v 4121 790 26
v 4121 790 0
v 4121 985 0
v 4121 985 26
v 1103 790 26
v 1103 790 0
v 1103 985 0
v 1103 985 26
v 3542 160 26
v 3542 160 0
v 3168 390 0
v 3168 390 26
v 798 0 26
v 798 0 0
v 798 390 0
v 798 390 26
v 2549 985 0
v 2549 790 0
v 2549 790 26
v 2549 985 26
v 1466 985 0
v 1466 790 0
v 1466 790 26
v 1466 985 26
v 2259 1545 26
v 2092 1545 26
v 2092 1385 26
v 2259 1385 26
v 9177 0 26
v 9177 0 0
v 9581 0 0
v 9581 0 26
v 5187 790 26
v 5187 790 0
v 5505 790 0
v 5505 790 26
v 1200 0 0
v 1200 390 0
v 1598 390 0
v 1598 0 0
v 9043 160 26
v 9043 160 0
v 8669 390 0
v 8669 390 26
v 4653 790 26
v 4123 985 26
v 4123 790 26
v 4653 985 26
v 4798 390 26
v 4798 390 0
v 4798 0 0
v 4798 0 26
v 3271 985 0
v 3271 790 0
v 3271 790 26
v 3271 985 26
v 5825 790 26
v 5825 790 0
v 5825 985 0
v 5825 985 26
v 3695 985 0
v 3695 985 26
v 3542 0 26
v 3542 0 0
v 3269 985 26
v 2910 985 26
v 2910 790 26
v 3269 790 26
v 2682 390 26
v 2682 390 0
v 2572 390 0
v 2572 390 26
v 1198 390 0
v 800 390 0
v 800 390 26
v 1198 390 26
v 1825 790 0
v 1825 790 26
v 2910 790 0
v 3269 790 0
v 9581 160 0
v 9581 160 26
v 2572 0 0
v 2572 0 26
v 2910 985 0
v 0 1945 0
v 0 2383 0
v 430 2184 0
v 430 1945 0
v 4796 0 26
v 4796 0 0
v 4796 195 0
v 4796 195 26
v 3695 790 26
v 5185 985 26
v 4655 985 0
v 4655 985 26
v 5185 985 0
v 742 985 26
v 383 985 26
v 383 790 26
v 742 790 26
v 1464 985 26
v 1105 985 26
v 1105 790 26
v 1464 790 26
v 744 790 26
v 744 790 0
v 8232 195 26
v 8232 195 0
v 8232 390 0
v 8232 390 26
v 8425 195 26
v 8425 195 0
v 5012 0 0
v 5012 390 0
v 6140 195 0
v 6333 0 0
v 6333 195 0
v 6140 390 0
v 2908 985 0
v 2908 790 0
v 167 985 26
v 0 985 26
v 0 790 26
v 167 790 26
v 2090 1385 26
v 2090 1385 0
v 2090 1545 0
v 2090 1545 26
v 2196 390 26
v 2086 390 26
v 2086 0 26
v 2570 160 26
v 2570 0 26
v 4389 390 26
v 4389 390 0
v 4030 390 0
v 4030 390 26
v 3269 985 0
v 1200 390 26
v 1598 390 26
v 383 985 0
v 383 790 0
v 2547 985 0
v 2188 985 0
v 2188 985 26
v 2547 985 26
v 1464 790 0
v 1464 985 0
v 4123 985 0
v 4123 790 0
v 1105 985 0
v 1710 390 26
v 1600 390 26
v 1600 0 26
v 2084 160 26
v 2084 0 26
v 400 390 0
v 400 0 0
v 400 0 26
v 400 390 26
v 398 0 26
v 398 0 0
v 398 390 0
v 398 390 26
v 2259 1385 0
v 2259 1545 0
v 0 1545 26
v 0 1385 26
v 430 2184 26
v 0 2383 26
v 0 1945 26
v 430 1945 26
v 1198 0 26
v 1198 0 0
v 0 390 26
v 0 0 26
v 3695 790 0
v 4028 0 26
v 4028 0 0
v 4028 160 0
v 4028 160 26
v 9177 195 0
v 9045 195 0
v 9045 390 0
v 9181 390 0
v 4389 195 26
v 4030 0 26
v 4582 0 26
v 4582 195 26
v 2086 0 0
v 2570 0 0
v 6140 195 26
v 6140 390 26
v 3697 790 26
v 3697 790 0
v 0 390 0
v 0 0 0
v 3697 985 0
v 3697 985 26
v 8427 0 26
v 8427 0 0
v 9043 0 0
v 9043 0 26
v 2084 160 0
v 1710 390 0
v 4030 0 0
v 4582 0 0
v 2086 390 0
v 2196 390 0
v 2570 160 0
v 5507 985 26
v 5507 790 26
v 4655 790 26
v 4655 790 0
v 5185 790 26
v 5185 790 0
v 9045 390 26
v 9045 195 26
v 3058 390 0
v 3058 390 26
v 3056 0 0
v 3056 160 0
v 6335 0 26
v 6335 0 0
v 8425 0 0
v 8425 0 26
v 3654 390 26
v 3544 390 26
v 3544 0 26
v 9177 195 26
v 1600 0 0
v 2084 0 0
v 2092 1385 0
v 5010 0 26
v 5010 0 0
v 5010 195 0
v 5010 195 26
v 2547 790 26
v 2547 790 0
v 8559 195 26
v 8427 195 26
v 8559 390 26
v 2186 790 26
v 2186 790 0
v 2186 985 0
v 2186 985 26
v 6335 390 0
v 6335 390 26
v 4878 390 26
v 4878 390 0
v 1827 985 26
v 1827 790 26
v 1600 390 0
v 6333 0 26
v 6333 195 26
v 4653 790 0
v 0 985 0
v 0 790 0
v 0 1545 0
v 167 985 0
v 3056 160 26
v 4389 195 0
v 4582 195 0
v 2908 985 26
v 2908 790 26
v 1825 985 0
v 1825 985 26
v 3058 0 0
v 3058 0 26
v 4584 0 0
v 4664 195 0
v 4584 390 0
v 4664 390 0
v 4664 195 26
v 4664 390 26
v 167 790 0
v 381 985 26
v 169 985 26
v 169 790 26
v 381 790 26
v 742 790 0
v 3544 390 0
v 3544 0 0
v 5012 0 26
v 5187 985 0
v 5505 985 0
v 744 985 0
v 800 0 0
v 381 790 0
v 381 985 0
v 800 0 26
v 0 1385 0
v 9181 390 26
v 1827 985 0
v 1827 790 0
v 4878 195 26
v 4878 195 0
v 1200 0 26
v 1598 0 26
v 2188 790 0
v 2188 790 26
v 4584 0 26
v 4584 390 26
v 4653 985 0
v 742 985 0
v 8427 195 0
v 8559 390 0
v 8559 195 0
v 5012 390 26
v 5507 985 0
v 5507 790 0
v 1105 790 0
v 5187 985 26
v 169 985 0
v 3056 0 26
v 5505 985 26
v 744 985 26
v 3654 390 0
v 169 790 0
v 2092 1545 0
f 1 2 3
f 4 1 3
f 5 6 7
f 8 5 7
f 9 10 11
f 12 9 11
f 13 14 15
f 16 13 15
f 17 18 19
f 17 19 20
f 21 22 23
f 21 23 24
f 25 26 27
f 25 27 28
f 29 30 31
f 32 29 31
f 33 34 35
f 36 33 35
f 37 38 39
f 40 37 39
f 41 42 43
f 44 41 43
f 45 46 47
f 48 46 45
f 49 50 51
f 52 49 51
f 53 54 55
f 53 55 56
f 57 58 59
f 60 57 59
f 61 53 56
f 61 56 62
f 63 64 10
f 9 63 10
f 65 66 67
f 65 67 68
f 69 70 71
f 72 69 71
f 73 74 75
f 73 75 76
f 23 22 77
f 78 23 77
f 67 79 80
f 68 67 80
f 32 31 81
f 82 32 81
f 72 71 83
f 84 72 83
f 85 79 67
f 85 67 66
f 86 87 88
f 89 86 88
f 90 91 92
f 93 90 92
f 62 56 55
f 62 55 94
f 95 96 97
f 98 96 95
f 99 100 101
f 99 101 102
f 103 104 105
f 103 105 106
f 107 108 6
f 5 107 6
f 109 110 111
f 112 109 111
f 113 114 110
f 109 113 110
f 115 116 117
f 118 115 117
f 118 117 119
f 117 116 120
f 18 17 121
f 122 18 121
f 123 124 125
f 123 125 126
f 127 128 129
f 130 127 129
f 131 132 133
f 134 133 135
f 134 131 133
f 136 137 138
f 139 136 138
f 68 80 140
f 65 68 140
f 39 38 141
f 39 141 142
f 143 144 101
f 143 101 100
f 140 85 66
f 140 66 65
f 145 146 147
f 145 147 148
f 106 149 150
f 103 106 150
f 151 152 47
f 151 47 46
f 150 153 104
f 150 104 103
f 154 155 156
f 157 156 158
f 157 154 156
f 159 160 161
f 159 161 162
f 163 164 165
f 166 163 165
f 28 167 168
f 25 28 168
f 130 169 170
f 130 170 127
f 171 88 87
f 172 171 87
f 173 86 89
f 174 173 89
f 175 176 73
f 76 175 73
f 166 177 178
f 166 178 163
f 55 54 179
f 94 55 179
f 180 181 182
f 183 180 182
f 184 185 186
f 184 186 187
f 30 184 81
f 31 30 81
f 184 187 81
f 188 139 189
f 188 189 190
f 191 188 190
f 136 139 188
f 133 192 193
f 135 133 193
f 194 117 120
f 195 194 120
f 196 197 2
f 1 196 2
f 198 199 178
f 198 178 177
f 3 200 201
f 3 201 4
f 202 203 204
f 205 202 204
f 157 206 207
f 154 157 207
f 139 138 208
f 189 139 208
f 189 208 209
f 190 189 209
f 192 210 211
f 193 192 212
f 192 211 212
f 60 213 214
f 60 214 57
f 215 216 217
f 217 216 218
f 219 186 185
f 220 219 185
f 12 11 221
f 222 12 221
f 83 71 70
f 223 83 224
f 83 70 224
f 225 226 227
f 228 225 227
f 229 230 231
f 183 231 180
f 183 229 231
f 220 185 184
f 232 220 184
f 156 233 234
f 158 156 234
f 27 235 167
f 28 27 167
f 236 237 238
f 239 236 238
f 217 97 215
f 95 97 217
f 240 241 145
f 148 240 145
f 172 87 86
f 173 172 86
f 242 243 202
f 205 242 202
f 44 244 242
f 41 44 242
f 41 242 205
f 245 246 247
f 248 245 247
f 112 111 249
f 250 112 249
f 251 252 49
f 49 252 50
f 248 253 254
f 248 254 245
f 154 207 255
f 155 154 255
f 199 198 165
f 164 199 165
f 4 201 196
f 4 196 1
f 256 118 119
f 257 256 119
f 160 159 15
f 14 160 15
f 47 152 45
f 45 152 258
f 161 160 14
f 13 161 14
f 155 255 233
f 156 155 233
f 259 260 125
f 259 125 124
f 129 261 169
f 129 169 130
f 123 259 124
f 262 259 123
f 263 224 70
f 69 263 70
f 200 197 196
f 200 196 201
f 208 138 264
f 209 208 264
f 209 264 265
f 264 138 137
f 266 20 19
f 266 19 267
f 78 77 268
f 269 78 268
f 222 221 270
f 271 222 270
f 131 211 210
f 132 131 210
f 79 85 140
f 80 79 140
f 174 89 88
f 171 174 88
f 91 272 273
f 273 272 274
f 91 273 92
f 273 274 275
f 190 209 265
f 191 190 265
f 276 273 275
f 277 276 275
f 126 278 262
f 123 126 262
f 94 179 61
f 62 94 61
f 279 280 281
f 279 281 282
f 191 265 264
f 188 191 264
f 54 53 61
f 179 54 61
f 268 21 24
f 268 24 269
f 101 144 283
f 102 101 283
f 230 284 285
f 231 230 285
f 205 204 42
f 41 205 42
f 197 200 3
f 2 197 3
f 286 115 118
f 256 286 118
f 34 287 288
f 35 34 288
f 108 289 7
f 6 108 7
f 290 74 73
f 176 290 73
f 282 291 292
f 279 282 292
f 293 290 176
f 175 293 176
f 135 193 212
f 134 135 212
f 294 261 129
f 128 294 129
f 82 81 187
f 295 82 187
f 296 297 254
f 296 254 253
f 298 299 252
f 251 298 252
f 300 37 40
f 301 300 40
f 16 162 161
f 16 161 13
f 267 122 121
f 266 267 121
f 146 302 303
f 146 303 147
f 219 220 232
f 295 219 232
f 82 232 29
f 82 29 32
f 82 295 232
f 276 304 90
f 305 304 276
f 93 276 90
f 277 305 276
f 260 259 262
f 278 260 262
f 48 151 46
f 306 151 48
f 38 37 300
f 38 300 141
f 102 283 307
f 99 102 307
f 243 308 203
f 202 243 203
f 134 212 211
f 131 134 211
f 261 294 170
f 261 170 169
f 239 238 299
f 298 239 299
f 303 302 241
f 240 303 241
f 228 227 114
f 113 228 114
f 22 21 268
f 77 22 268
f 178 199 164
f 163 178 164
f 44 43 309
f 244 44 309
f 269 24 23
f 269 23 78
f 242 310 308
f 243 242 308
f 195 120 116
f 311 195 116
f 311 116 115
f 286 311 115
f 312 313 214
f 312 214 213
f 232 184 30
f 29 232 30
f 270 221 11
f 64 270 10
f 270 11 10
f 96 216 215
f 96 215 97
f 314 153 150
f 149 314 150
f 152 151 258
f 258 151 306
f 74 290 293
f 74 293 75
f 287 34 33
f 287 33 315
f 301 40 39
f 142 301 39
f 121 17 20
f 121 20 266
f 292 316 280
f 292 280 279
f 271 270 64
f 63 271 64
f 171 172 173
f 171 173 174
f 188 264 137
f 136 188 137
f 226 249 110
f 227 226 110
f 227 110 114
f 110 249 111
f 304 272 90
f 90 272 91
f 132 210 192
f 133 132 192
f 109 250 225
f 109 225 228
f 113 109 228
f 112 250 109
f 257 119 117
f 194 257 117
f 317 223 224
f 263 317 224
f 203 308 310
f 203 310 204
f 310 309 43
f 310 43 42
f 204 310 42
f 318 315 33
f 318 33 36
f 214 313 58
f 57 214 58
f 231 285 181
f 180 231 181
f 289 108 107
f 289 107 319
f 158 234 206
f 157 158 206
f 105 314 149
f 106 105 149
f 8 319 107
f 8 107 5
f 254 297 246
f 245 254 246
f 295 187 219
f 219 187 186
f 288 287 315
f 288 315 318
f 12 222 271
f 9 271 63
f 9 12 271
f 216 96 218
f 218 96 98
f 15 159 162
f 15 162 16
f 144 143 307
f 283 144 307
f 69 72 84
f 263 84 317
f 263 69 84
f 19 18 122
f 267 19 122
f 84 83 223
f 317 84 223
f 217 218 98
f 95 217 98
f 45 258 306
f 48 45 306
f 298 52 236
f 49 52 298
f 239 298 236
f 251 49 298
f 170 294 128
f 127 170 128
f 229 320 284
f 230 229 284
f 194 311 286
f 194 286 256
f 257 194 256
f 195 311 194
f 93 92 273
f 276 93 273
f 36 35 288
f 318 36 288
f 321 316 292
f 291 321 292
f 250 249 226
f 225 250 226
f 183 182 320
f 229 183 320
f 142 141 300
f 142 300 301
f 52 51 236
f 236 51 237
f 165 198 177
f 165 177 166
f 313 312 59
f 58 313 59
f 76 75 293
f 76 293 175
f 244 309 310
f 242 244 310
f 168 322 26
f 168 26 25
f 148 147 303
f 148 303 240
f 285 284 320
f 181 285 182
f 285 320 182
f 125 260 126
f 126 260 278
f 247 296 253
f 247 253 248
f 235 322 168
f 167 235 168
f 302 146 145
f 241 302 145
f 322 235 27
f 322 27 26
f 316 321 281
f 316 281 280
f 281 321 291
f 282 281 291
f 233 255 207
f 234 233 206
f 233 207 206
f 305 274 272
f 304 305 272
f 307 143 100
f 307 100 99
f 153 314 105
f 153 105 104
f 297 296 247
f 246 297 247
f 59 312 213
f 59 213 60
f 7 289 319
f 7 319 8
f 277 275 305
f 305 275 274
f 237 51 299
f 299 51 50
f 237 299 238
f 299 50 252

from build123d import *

# Parameters (mm, degrees)
F0_W     = 398
F0_H     = 390
F0_W_2   = 167
F0_H_2   = 195
F0_W_3   = 212
F0_W_4   = 359
F0_W_5   = 424
F0_W_6   = 530
F0_W_7   = 318
F0_W_8   = 2090
F0_H_3   = 160
F1_DEPTH = 26


with BuildPart() as f1:
    # F0 (on Top) → F1 (new body)
    with BuildSketch(Plane.XY):
        with Locations((199, 195)):
            Rectangle(F0_W, F0_H)
        with Locations((599, 195)):
            Rectangle(F0_W, F0_H)
        with Locations((999, 195)):
            Rectangle(F0_W, F0_H)
        with Locations((1399, 195)):
            Rectangle(F0_W, F0_H)
        Polygon((1710, 390), (1600, 390), (1600, 0), (2084, 0), (2084, 160), align=None)
        Polygon((2196, 390), (2086, 390), (2086, 0), (2570, 0), (2570, 160), align=None)
        Polygon((2682, 390), (2572, 390), (2572, 0), (3056, 0), (3056, 160), align=None)
        Polygon((3168, 390), (3058, 390), (3058, 0), (3542, 0), (3542, 160), align=None)
        Polygon((3654, 390), (3544, 390), (3544, 0), (4028, 0), (4028, 160), align=None)
        with Locations((83.5, 887.5)):
            Rectangle(F0_W_2, F0_H_2)
        with Locations((275, 887.5)):
            Rectangle(F0_W_3, F0_H_2)
        with Locations((562.5, 887.5)):
            Rectangle(F0_W_4, F0_H_2)
        with Locations((923.5, 887.5)):
            Rectangle(F0_W_4, F0_H_2)
        with Locations((1284.5, 887.5)):
            Rectangle(F0_W_4, F0_H_2)
        with Locations((1645.5, 887.5)):
            Rectangle(F0_W_4, F0_H_2)
        with Locations((2006.5, 887.5)):
            Rectangle(F0_W_4, F0_H_2)
        with Locations((2367.5, 887.5)):
            Rectangle(F0_W_4, F0_H_2)
        with Locations((2728.5, 887.5)):
            Rectangle(F0_W_4, F0_H_2)
        with Locations((3089.5, 887.5)):
            Rectangle(F0_W_4, F0_H_2)
        with Locations((3483, 887.5)):
            Rectangle(F0_W_5, F0_H_2)
        with Locations((3909, 887.5)):
            Rectangle(F0_W_5, F0_H_2)
        with Locations((4388, 887.5)):
            Rectangle(F0_W_6, F0_H_2)
        with Locations((4920, 887.5)):
            Rectangle(F0_W_6, F0_H_2)
        with Locations((5346, 887.5)):
            Rectangle(F0_W_7, F0_H_2)
        with Locations((5666, 887.5)):
            Rectangle(F0_W_7, F0_H_2)
        Polygon((4030, 390), (4030, 0), (4582, 0), (4582, 195), (4389, 195), (4389, 390), align=None)
        Polygon((4584, 390), (4584, 0), (4796, 0), (4796, 195), (4664, 195), (4664, 390), align=None)
        Polygon((4878, 390), (4798, 390), (4798, 0), (5010, 0), (5010, 195), (4878, 195), align=None)
        Polygon((5012, 390), (5012, 0), (6333, 0), (6333, 195), (6140, 195), (6140, 390), align=None)
        Polygon((6335, 390), (6335, 0), (8425, 0), (8425, 195), (8232, 195), (8232, 390), align=None)
        with Locations((1045, 1465)):
            Rectangle(F0_W_8, F0_H_3)
        Polygon((8427, 195), (8427, 0), (9043, 0), (9043, 160), (8669, 390), (8559, 390), (8559, 195), align=None)
        Polygon((9177, 195), (9177, 0), (9581, 0), (9581, 160), (9181, 390), (9045, 390), (9045, 195), align=None)
        Polygon((0, 2383), (0, 1945), (430, 1945), (430, 2184), align=None)
        with Locations((2175.5, 1465)):
            Rectangle(F0_W_2, F0_H_3)
    extrude(amount=F1_DEPTH)


solid = f1.part
